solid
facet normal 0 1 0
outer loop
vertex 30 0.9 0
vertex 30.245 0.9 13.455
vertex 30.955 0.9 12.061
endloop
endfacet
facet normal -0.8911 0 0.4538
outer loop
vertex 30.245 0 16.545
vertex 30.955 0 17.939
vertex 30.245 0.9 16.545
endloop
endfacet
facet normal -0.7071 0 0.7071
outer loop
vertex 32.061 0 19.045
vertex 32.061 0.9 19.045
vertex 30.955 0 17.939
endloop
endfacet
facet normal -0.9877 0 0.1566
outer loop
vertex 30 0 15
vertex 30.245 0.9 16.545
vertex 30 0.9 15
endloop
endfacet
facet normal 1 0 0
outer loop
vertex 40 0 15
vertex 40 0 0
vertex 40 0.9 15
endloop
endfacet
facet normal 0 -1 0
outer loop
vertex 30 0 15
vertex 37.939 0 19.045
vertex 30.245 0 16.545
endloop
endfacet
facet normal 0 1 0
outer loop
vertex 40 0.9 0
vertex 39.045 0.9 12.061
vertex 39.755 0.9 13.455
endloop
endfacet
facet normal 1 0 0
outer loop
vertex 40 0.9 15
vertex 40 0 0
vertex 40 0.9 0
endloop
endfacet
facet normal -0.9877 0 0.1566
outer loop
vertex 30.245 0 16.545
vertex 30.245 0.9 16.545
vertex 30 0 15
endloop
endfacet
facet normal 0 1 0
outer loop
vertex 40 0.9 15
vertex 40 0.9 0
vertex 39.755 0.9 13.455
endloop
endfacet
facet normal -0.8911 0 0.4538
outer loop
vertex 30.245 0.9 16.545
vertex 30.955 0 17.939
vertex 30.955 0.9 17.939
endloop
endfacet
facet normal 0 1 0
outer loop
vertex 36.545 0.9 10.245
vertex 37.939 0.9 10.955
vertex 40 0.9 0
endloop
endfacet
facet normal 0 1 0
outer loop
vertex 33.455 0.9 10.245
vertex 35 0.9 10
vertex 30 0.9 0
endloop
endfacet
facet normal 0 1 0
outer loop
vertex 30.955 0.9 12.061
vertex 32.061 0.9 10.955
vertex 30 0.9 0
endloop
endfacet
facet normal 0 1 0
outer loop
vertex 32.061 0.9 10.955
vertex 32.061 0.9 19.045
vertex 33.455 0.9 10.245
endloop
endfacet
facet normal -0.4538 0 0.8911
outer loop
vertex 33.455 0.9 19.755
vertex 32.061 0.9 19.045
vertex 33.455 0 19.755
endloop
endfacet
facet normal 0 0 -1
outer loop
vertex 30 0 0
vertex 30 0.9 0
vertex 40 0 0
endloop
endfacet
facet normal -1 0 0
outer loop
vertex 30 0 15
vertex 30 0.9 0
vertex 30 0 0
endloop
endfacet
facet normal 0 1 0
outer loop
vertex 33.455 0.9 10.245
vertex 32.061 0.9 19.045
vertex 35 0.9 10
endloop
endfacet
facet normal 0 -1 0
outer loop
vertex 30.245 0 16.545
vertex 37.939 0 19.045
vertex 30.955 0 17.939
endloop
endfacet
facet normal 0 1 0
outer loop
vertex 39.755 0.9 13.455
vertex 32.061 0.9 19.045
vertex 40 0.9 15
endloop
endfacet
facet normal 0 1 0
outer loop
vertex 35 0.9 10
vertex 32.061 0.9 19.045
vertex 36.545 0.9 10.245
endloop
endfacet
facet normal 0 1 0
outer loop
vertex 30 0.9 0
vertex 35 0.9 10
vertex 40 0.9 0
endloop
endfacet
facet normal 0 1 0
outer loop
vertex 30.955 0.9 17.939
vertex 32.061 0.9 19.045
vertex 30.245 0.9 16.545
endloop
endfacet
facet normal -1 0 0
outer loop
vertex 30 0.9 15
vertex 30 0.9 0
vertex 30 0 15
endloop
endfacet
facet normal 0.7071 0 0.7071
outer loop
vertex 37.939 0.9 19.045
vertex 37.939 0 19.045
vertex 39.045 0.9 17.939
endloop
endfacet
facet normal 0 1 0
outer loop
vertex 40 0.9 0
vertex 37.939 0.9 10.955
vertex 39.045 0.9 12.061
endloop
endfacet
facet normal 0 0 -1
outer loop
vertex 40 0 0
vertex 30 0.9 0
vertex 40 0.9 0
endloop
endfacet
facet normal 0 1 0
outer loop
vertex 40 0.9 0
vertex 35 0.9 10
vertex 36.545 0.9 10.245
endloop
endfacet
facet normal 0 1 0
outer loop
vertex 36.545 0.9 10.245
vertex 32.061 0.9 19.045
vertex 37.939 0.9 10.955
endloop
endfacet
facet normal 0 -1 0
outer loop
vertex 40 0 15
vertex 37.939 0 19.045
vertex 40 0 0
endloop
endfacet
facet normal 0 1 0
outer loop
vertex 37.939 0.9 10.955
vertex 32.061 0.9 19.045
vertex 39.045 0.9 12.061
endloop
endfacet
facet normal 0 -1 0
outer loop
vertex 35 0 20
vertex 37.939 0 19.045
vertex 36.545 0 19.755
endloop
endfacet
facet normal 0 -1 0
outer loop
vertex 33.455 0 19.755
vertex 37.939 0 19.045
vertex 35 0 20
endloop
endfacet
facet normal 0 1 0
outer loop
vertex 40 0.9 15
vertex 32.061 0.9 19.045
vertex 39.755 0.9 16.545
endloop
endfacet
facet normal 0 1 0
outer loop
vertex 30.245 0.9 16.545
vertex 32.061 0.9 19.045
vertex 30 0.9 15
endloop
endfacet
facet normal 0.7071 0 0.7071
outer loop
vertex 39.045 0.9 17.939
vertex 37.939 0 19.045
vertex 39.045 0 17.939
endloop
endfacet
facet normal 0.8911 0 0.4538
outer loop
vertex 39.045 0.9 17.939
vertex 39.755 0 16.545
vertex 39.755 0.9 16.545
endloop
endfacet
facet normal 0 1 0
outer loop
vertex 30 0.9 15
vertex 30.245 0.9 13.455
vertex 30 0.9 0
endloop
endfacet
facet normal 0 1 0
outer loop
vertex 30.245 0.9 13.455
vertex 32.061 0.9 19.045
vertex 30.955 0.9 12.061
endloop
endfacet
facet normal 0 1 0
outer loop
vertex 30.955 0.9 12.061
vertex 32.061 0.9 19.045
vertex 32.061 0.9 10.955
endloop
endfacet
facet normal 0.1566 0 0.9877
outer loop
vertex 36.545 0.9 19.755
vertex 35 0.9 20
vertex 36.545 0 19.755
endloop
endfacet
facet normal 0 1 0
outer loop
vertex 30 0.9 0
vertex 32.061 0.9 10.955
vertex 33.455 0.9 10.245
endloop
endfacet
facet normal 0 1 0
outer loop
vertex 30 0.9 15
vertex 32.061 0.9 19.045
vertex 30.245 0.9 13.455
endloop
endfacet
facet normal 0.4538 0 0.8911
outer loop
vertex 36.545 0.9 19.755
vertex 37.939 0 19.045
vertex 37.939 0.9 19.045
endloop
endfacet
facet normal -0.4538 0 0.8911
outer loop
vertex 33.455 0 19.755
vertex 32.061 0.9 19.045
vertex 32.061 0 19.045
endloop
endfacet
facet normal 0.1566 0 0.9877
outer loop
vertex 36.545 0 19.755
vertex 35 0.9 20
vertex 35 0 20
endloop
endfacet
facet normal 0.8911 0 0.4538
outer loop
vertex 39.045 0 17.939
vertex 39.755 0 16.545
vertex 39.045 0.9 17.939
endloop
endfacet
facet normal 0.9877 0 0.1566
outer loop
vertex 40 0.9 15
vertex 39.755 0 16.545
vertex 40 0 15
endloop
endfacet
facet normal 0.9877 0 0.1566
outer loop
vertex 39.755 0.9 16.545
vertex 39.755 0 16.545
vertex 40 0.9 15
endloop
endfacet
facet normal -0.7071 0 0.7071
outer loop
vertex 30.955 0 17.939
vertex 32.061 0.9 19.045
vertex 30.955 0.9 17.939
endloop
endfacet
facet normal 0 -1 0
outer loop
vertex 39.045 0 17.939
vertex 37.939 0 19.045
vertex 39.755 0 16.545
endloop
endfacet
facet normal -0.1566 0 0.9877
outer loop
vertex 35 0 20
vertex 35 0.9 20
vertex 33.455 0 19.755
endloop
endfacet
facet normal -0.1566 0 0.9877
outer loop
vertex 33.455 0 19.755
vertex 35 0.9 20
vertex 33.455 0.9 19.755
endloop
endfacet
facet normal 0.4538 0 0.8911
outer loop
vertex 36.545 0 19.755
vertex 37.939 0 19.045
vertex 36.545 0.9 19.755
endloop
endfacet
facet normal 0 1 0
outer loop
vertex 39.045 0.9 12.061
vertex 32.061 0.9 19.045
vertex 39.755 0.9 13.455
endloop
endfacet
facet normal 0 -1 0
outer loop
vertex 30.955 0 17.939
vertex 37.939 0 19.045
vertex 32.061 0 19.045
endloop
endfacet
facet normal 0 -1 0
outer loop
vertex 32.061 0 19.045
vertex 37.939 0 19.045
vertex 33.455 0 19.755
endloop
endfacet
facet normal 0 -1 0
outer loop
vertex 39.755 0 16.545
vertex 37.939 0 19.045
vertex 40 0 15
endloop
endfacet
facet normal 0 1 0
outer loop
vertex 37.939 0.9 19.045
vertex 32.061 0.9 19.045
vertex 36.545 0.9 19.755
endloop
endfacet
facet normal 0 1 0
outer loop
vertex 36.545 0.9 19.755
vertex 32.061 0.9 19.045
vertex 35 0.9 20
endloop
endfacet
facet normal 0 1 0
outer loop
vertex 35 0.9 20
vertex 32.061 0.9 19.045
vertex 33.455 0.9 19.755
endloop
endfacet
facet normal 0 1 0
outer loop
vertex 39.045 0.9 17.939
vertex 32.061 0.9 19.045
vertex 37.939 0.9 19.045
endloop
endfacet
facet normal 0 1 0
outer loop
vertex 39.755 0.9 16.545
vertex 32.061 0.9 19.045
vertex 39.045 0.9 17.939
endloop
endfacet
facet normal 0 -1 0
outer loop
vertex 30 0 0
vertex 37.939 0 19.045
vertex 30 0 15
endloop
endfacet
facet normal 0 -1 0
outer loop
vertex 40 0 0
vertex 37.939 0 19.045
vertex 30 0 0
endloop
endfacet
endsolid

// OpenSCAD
// file: ../lib/upsidedown.scad
// v is a row vector.  Output is the offset needed if the box is upsidedown
function upsidedown_offset(v) = [v[0], $box_size[1]-v[1], v[2]];
function upsidedown_angle(angle) = -angle;
module upsidedown_polygon() {
  mirror([0,1,0]) {
    children();
  }
}
// file: ../lib/import_children.scad
// All modules that operate in levels must be wrapped with this.
// children(0) is just pass through.  children(1) is doing the work.
// If level matches $level or either are -1, do the second, either do the first.
module level_preamble(level) {
  if ($level == level || $level == -1 || level == -1) {
    children([1:$children-1]);
  } else {
    children(0);
  }
}

module level_import(level) {
  if ($level == -1 || level == -1) {
    children();
  } else {
    if ($import_filename) {
      import($import_filename);
    }
  } 
}
// file: ../lib/box_port.scad
use <box_top.scad>;
use <upsidedown.scad>;
use <import_children.scad>;

// button_offset should be offset to move the first child relative to
// bottom-left corner of the box top when upside-down.  First child
// should be the button's 2D projection, it will be rounded to a
// smaller size.  The rest is the box.  The button_height is how high
// it is off the top of the pcb.

// Made as thick as tab_thickness and padded by $epsilon on both sides.
module front_port_hole(port_offset, tab_thickness, tab_padding) {
  // Make the hole for the port.
  translate([port_offset[0], tab_thickness+tab_padding, port_offset[2]]) {
    rotate([90,0,0]) {
      linear_extrude(tab_thickness+2*tab_padding) {
        children();
      }
    }
  }
}

module project_front_port_hole_to_xy(extend_below,port_offset,
                                     tab_thickness, tab_padding) {
    front_port_hole(port_offset,
                    tab_thickness, tab_padding) {
      children();
    }
    project_front_port_hole_to_xy_without_children(extend_below,port_offset,
                                                   tab_thickness, tab_padding) {
      children();
    }
}

  module project_front_port_hole_to_xy_without_children(extend_below,port_offset,
                                                        tab_thickness, tab_padding) {
  union() {
    difference() {
      hull() {
        front_port_hole(port_offset,
                        tab_thickness, tab_padding) {
          children();
        }
        translate([0,0,-extend_below]) {
          linear_extrude($epsilon) {
            projection() {
              front_port_hole(port_offset,
                              tab_thickness, tab_padding) {
                children();
              }
            }
          }
        }
      }
      /*translate([0,0,$epsilon]) {
        hull() {
          front_port_hole(port_offset,
                          tab_thickness+$epsilon, tab_padding) {
            children();
          }
          translate([0,0,$box_size[2]]) {
            linear_extrude($epsilon) {
              projection() {
                front_port_hole(port_offset,
                                tab_thickness+$epsilon, tab_padding) {
                  children();
                }
              }
            }
          }
        }
      }*/
    }
  }
}


//$epsilon=0.3;
// Extends the 3d shape down to the xy plane, extending below by extend_below.
module project_to_xy(extend_below) {
  union() {
    children();
    difference() {
      hull() {
        children();
        translate([0,0,-extend_below]) {
          linear_extrude($epsilon) {
            projection() {
              children();
            }
          }
        }
      }
      translate([0,$epsilon,$epsilon]) {
        hull() {
          children();
          translate([0,0,$box_size[2]]) {
            linear_extrude($epsilon) {
              projection() {
                children();
              }
            }
          }
        }
      }
      translate([0,-$epsilon,$epsilon]) {
        hull() {
          children();
          translate([0,0,$box_size[2]]) {
            linear_extrude($epsilon) {
              projection() {
                children();
              }
            }
          }
        }
      }
    }
  }
}

// Project the child down to xy but without the original child.
module tab_without_lap(port_offset, tab_thickness, tab_padding, extend_below) {
  difference() {
    project_front_port_hole_to_xy_without_children(extend_below, port_offset,
                                                   tab_thickness, tab_padding) {
      children();
    }
/*    minkowski(convexity=10) {
      sphere(r=$epsilon);
      front_port_hole(port_offset,
                      tab_thickness, tab_padding) {
        children();
      }
    }*/
  }
}

//$epsilon=0.1;

// Create the left or right most edge of the child.
// direction is "left" or "right"
module lap_strip(port_offset, tab_thickness, tab_padding, direction, extend_below) {
  shift = direction=="left" ? $epsilon : -$epsilon;
  difference() {
    tab_without_lap(port_offset,tab_thickness,tab_padding,extend_below) {
      children();
    }
    /*minkowski(convexity=10) {
      sphere(r=$epsilon);
      translate([shift, 0,0]) {
        tab_without_lap(port_offset,tab_thickness,tab_padding,extend_below) {
          children();
        }
      }
    }*/
    translate([shift, -$epsilon, $epsilon]) {
      hull() // For some reason, this helps remove an artifact in the bottom.
        tab_without_lap(port_offset,tab_thickness+2*$epsilon, tab_padding, extend_below) {
          children();
      }
    }
    translate([shift, -$epsilon, -$epsilon]) {
      hull() // For some reason, this helps remove an artifact in the bottom.
      tab_without_lap(port_offset,tab_thickness+2*$epsilon, tab_padding, extend_below) {
        children();
      }
    }
  }
}
//$epsilon=0.01;
// Create the rightmost or leftmost edge of the child, extended to
// $thickness width..
module lap(port_offset, tab_thickness, tab_padding, direction, extend_below) {
  shift = direction=="left" ? -$thickness : $thickness;
  hull() {
    lap_strip(port_offset, tab_thickness, tab_padding, direction, extend_below) {
      children();
    }
    translate([shift,0,0]) {
      lap_strip(port_offset, tab_thickness, tab_padding, direction, extend_below) {
        children();
      }
    }
  }
}

// Project child to xy and add side wings in x on both sides.
module tab_with_lap(port_offset, tab_thickness, tab_padding, extend_below) {
  /*lap(port_offset, tab_thickness, tab_padding, "left", extend_below) {
    children();
  }
  lap(port_offset, tab_thickness, tab_padding, "right", extend_below) {
    children();
  }*/
  tab_without_lap(port_offset, tab_thickness, tab_padding, extend_below) {
    children();
  }
}

//$epsilon=0.3;
// First child should be a two-dimensional shape to cut out of the
// front of the box.  port_offset should have only positive y and z
// values.
module add_front_port_top(port_offset, level) {
  level_preamble(level) {
    children([1:$children-1]);
    difference() {
      level_import(level) {
        children([1:$children-1]);
      }
      render_box_top("demo", -1) {
        union() {
          project_front_port_hole_to_xy($epsilon, port_offset, $thickness, $epsilon) {
            children(0);
          }
          // For the overlapping section, half thickness.
          tab_with_lap(port_offset,
                       $thickness/2+$static_clearance/2,
                       $epsilon,
                       $epsilon) {
            children(0);
          }
        }
      }
    }
  }
}

//$epsilon=0.5;

module add_front_port_bottom(port_offset, level) {
  level_preamble(level) {
    children([1:$children-1]);
    /*level_import(level) {
      children([1:$children-1]);
    }*/
    union() {
      /*tab_without_lap(port_offset, $thickness, 0) {
        children(0);
      }*/
      tab_with_lap(port_offset, $thickness/2-$static_clearance/2, 0, 0) {
        children(0);
      }
    }
    /*translate([0,0,$thickness]) {
      rotate([-90,0,0]) {
        linear_extrude($thickness + $static_clearance + $epsilon) {
          projection() {
            front_port_hole(port_offset, $thickness, 0) {
              children(0);
            }
          }
        }
      }
    }*/
  }
}
// file: ../lib/box_bottom.scad
use <import_children.scad>;

module box_bottom(level) {
  level_preamble(level) {
    union() {}
    if (!$box_size) {
      echo("ERROR: $box_size not defined in box_bottom");
      UNDEFINED_DYNAMIC_VARIABLE_ERROR();
    }
    if (!$thickness) {
      echo("ERROR: $thickness not defined in box_bottom");
      UNDEFINED_DYNAMIC_VARIABLE_ERROR();
    }
    if (!$static_clearance) {
      echo("ERROR: $static_clearance not defined in box_bottom");
      UNDEFINED_DYNAMIC_VARIABLE_ERROR();
    }
    translate ([$thickness+$static_clearance, $thickness+$static_clearance, 0]) {
      cube($box_size*[[1,0,0],
                      [0,1,0],
                      [0,0,0]] +
           [-2*($thickness+$static_clearance),
            -2*($thickness+$static_clearance),
            $thickness]);
    }
  }
}

module render_box_bottom(style, level) {
  level_preamble(level) {
    children();
    if (style == "print" || style == "demo") {
      level_import(level) {
        children();
      }
    }
  }
}

//box_bottom($box_size=[100,50,20], $thickness=3, $static_clearance=0.2);
//demo_box_bottom($box_size=[100,50,20], $thickness=3, $static_clearance=0.2) box_bottom();
//print_box_bottom($box_size=[100,50,20], $thickness=3, $static_clearance=0.2) box_bottom();
// file: ../lib/box_top.scad
use <import_children.scad>;

// Creates a rounded box top with a flat bottom.
// Assumes $thickness, $epsilon.
// Aligned so that the box is upside-down from usage and the inner box lines up with X and Y and Z.
module box_top(level) {
  level_preamble(level) {
    union() {}
    if (!$box_size) {
      echo("ERROR: $box_size not defined in box_top");
      UNDEFINED_DYNAMIC_VARIABLE_ERROR();
    }
    if (!$thickness) {
      echo("ERROR: $thickness not defined in box_top");
      UNDEFINED_DYNAMIC_VARIABLE_ERROR();
    }
    if (!$epsilon) {
      echo("ERROR: $epsilon not defined in box_top");
      UNDEFINED_DYNAMIC_VARIABLE_ERROR();
    }
    inside_dimensions = $box_size-[2*$thickness, 2*$thickness, $thickness];
    translate([$thickness, $thickness, $thickness]) {
      difference () {
        hull() {
          translate([                   0,                   0,                   0]) sphere(r=$thickness);
          translate([                   0,                   0,inside_dimensions[2]]) sphere(r=$thickness);
          translate([                   0,inside_dimensions[1],                   0]) sphere(r=$thickness);
          translate([                   0,inside_dimensions[1],inside_dimensions[2]]) sphere(r=$thickness);
          translate([inside_dimensions[0],                   0,                   0]) sphere(r=$thickness);
          translate([inside_dimensions[0],                   0,inside_dimensions[2]]) sphere(r=$thickness);
          translate([inside_dimensions[0],inside_dimensions[1],                   0]) sphere(r=$thickness);
          translate([inside_dimensions[0],inside_dimensions[1],inside_dimensions[2]]) sphere(r=$thickness);
        }
        cube(inside_dimensions+[0,0,$epsilon]);
        translate([-$thickness-$epsilon,
                   -$thickness-$epsilon,
                   $box_size[2]-$thickness]) {
          cube($box_size*[[1,0,0],[0,1,0],[0,0,0]] +
               [2*$epsilon, 2*$epsilon, $thickness + $epsilon]);
        }
      }
    }
  }
}

module render_box_top(style, level) {
  level_preamble(level) {
    children();
    if (style == "print") {
      level_import(level) {
        children();
      }
    }
    if (style == "demo") {
      if (!$box_size) {
        echo("ERROR: $box_size not defined in render_box_top");
        UNDEFINED_DYNAMIC_VARIABLE_ERROR();
      }
      translate([0, $box_size[1], $box_size[2]]) {
        rotate([180,0,0]) {
          level_import(level) {
            children();
          }
        }
      }
    }
  }
}

//box_top($box_size=[50,40,10], $epsilon=0.01, $thickness=3, $fn=50);
//demo_box_top($thickness=3, $box_size=[50,40,10]) box_top([50,100,20], $epsilon=0.01, $fn=50);
//print_box_top($thickness=3, $box_size=[50,40,10]) box_top([50,100,20], $epsilon=0.01, $fn=50);
// file: ../lib/globals.scad
$thickness = 2;
$epsilon = 0.01;
$fn = 10;
$static_clearance = 0.2;
$dynamic_clearance = 0.3;
// main file
include <../lib/globals.scad>;
use <../lib/box_top.scad>;
use <../lib/box_bottom.scad>;

use <../lib/box_port.scad>;

$pcb_top_clearance = 10;
$pcb_thickness = 10;
$box_size = [100,50,30];
$inner_thickness = 1;
$rounding = 0.5;
module arrow_up() {
  circle(r=5);
  /*polygon(points=[
      [0,7],
      [5,7],
      [5,0],
      [2,3],
      [0,0]            
                  ],
          paths=[
              [0,1,2,3,4]
                 ]
          );*/
}
$fn=20;
$group = "bottom";
$level = -1;
if ($group == "demo" || $group == "top") {
  render_box_top($group == "demo" ? "demo" : "print", 3) {
    add_front_port_top([15,0,15], 2) {
      arrow_up();
      add_front_port_top([15,0,15], 1) {
        arrow_up();
        box_top(0);
      }
    }
  }
}
if ($group == "demo" || $group == "bottom") {
  render_box_bottom($group == "demo" ? "demo" : "print", 3) {
    add_front_port_bottom([35,0,15], 2)  {
      circle(r=5);
      add_front_port_bottom([15,0,15], 1)  {
        circle(r=5);
        box_bottom(0);
      }
    }
  }
}
/*if ($group == "demo" || $group == "bottom") {
  render_box_bottom($group == "demo" ? "demo" : "print", 0) {
    box_bottom(0);
  }
}
*/
